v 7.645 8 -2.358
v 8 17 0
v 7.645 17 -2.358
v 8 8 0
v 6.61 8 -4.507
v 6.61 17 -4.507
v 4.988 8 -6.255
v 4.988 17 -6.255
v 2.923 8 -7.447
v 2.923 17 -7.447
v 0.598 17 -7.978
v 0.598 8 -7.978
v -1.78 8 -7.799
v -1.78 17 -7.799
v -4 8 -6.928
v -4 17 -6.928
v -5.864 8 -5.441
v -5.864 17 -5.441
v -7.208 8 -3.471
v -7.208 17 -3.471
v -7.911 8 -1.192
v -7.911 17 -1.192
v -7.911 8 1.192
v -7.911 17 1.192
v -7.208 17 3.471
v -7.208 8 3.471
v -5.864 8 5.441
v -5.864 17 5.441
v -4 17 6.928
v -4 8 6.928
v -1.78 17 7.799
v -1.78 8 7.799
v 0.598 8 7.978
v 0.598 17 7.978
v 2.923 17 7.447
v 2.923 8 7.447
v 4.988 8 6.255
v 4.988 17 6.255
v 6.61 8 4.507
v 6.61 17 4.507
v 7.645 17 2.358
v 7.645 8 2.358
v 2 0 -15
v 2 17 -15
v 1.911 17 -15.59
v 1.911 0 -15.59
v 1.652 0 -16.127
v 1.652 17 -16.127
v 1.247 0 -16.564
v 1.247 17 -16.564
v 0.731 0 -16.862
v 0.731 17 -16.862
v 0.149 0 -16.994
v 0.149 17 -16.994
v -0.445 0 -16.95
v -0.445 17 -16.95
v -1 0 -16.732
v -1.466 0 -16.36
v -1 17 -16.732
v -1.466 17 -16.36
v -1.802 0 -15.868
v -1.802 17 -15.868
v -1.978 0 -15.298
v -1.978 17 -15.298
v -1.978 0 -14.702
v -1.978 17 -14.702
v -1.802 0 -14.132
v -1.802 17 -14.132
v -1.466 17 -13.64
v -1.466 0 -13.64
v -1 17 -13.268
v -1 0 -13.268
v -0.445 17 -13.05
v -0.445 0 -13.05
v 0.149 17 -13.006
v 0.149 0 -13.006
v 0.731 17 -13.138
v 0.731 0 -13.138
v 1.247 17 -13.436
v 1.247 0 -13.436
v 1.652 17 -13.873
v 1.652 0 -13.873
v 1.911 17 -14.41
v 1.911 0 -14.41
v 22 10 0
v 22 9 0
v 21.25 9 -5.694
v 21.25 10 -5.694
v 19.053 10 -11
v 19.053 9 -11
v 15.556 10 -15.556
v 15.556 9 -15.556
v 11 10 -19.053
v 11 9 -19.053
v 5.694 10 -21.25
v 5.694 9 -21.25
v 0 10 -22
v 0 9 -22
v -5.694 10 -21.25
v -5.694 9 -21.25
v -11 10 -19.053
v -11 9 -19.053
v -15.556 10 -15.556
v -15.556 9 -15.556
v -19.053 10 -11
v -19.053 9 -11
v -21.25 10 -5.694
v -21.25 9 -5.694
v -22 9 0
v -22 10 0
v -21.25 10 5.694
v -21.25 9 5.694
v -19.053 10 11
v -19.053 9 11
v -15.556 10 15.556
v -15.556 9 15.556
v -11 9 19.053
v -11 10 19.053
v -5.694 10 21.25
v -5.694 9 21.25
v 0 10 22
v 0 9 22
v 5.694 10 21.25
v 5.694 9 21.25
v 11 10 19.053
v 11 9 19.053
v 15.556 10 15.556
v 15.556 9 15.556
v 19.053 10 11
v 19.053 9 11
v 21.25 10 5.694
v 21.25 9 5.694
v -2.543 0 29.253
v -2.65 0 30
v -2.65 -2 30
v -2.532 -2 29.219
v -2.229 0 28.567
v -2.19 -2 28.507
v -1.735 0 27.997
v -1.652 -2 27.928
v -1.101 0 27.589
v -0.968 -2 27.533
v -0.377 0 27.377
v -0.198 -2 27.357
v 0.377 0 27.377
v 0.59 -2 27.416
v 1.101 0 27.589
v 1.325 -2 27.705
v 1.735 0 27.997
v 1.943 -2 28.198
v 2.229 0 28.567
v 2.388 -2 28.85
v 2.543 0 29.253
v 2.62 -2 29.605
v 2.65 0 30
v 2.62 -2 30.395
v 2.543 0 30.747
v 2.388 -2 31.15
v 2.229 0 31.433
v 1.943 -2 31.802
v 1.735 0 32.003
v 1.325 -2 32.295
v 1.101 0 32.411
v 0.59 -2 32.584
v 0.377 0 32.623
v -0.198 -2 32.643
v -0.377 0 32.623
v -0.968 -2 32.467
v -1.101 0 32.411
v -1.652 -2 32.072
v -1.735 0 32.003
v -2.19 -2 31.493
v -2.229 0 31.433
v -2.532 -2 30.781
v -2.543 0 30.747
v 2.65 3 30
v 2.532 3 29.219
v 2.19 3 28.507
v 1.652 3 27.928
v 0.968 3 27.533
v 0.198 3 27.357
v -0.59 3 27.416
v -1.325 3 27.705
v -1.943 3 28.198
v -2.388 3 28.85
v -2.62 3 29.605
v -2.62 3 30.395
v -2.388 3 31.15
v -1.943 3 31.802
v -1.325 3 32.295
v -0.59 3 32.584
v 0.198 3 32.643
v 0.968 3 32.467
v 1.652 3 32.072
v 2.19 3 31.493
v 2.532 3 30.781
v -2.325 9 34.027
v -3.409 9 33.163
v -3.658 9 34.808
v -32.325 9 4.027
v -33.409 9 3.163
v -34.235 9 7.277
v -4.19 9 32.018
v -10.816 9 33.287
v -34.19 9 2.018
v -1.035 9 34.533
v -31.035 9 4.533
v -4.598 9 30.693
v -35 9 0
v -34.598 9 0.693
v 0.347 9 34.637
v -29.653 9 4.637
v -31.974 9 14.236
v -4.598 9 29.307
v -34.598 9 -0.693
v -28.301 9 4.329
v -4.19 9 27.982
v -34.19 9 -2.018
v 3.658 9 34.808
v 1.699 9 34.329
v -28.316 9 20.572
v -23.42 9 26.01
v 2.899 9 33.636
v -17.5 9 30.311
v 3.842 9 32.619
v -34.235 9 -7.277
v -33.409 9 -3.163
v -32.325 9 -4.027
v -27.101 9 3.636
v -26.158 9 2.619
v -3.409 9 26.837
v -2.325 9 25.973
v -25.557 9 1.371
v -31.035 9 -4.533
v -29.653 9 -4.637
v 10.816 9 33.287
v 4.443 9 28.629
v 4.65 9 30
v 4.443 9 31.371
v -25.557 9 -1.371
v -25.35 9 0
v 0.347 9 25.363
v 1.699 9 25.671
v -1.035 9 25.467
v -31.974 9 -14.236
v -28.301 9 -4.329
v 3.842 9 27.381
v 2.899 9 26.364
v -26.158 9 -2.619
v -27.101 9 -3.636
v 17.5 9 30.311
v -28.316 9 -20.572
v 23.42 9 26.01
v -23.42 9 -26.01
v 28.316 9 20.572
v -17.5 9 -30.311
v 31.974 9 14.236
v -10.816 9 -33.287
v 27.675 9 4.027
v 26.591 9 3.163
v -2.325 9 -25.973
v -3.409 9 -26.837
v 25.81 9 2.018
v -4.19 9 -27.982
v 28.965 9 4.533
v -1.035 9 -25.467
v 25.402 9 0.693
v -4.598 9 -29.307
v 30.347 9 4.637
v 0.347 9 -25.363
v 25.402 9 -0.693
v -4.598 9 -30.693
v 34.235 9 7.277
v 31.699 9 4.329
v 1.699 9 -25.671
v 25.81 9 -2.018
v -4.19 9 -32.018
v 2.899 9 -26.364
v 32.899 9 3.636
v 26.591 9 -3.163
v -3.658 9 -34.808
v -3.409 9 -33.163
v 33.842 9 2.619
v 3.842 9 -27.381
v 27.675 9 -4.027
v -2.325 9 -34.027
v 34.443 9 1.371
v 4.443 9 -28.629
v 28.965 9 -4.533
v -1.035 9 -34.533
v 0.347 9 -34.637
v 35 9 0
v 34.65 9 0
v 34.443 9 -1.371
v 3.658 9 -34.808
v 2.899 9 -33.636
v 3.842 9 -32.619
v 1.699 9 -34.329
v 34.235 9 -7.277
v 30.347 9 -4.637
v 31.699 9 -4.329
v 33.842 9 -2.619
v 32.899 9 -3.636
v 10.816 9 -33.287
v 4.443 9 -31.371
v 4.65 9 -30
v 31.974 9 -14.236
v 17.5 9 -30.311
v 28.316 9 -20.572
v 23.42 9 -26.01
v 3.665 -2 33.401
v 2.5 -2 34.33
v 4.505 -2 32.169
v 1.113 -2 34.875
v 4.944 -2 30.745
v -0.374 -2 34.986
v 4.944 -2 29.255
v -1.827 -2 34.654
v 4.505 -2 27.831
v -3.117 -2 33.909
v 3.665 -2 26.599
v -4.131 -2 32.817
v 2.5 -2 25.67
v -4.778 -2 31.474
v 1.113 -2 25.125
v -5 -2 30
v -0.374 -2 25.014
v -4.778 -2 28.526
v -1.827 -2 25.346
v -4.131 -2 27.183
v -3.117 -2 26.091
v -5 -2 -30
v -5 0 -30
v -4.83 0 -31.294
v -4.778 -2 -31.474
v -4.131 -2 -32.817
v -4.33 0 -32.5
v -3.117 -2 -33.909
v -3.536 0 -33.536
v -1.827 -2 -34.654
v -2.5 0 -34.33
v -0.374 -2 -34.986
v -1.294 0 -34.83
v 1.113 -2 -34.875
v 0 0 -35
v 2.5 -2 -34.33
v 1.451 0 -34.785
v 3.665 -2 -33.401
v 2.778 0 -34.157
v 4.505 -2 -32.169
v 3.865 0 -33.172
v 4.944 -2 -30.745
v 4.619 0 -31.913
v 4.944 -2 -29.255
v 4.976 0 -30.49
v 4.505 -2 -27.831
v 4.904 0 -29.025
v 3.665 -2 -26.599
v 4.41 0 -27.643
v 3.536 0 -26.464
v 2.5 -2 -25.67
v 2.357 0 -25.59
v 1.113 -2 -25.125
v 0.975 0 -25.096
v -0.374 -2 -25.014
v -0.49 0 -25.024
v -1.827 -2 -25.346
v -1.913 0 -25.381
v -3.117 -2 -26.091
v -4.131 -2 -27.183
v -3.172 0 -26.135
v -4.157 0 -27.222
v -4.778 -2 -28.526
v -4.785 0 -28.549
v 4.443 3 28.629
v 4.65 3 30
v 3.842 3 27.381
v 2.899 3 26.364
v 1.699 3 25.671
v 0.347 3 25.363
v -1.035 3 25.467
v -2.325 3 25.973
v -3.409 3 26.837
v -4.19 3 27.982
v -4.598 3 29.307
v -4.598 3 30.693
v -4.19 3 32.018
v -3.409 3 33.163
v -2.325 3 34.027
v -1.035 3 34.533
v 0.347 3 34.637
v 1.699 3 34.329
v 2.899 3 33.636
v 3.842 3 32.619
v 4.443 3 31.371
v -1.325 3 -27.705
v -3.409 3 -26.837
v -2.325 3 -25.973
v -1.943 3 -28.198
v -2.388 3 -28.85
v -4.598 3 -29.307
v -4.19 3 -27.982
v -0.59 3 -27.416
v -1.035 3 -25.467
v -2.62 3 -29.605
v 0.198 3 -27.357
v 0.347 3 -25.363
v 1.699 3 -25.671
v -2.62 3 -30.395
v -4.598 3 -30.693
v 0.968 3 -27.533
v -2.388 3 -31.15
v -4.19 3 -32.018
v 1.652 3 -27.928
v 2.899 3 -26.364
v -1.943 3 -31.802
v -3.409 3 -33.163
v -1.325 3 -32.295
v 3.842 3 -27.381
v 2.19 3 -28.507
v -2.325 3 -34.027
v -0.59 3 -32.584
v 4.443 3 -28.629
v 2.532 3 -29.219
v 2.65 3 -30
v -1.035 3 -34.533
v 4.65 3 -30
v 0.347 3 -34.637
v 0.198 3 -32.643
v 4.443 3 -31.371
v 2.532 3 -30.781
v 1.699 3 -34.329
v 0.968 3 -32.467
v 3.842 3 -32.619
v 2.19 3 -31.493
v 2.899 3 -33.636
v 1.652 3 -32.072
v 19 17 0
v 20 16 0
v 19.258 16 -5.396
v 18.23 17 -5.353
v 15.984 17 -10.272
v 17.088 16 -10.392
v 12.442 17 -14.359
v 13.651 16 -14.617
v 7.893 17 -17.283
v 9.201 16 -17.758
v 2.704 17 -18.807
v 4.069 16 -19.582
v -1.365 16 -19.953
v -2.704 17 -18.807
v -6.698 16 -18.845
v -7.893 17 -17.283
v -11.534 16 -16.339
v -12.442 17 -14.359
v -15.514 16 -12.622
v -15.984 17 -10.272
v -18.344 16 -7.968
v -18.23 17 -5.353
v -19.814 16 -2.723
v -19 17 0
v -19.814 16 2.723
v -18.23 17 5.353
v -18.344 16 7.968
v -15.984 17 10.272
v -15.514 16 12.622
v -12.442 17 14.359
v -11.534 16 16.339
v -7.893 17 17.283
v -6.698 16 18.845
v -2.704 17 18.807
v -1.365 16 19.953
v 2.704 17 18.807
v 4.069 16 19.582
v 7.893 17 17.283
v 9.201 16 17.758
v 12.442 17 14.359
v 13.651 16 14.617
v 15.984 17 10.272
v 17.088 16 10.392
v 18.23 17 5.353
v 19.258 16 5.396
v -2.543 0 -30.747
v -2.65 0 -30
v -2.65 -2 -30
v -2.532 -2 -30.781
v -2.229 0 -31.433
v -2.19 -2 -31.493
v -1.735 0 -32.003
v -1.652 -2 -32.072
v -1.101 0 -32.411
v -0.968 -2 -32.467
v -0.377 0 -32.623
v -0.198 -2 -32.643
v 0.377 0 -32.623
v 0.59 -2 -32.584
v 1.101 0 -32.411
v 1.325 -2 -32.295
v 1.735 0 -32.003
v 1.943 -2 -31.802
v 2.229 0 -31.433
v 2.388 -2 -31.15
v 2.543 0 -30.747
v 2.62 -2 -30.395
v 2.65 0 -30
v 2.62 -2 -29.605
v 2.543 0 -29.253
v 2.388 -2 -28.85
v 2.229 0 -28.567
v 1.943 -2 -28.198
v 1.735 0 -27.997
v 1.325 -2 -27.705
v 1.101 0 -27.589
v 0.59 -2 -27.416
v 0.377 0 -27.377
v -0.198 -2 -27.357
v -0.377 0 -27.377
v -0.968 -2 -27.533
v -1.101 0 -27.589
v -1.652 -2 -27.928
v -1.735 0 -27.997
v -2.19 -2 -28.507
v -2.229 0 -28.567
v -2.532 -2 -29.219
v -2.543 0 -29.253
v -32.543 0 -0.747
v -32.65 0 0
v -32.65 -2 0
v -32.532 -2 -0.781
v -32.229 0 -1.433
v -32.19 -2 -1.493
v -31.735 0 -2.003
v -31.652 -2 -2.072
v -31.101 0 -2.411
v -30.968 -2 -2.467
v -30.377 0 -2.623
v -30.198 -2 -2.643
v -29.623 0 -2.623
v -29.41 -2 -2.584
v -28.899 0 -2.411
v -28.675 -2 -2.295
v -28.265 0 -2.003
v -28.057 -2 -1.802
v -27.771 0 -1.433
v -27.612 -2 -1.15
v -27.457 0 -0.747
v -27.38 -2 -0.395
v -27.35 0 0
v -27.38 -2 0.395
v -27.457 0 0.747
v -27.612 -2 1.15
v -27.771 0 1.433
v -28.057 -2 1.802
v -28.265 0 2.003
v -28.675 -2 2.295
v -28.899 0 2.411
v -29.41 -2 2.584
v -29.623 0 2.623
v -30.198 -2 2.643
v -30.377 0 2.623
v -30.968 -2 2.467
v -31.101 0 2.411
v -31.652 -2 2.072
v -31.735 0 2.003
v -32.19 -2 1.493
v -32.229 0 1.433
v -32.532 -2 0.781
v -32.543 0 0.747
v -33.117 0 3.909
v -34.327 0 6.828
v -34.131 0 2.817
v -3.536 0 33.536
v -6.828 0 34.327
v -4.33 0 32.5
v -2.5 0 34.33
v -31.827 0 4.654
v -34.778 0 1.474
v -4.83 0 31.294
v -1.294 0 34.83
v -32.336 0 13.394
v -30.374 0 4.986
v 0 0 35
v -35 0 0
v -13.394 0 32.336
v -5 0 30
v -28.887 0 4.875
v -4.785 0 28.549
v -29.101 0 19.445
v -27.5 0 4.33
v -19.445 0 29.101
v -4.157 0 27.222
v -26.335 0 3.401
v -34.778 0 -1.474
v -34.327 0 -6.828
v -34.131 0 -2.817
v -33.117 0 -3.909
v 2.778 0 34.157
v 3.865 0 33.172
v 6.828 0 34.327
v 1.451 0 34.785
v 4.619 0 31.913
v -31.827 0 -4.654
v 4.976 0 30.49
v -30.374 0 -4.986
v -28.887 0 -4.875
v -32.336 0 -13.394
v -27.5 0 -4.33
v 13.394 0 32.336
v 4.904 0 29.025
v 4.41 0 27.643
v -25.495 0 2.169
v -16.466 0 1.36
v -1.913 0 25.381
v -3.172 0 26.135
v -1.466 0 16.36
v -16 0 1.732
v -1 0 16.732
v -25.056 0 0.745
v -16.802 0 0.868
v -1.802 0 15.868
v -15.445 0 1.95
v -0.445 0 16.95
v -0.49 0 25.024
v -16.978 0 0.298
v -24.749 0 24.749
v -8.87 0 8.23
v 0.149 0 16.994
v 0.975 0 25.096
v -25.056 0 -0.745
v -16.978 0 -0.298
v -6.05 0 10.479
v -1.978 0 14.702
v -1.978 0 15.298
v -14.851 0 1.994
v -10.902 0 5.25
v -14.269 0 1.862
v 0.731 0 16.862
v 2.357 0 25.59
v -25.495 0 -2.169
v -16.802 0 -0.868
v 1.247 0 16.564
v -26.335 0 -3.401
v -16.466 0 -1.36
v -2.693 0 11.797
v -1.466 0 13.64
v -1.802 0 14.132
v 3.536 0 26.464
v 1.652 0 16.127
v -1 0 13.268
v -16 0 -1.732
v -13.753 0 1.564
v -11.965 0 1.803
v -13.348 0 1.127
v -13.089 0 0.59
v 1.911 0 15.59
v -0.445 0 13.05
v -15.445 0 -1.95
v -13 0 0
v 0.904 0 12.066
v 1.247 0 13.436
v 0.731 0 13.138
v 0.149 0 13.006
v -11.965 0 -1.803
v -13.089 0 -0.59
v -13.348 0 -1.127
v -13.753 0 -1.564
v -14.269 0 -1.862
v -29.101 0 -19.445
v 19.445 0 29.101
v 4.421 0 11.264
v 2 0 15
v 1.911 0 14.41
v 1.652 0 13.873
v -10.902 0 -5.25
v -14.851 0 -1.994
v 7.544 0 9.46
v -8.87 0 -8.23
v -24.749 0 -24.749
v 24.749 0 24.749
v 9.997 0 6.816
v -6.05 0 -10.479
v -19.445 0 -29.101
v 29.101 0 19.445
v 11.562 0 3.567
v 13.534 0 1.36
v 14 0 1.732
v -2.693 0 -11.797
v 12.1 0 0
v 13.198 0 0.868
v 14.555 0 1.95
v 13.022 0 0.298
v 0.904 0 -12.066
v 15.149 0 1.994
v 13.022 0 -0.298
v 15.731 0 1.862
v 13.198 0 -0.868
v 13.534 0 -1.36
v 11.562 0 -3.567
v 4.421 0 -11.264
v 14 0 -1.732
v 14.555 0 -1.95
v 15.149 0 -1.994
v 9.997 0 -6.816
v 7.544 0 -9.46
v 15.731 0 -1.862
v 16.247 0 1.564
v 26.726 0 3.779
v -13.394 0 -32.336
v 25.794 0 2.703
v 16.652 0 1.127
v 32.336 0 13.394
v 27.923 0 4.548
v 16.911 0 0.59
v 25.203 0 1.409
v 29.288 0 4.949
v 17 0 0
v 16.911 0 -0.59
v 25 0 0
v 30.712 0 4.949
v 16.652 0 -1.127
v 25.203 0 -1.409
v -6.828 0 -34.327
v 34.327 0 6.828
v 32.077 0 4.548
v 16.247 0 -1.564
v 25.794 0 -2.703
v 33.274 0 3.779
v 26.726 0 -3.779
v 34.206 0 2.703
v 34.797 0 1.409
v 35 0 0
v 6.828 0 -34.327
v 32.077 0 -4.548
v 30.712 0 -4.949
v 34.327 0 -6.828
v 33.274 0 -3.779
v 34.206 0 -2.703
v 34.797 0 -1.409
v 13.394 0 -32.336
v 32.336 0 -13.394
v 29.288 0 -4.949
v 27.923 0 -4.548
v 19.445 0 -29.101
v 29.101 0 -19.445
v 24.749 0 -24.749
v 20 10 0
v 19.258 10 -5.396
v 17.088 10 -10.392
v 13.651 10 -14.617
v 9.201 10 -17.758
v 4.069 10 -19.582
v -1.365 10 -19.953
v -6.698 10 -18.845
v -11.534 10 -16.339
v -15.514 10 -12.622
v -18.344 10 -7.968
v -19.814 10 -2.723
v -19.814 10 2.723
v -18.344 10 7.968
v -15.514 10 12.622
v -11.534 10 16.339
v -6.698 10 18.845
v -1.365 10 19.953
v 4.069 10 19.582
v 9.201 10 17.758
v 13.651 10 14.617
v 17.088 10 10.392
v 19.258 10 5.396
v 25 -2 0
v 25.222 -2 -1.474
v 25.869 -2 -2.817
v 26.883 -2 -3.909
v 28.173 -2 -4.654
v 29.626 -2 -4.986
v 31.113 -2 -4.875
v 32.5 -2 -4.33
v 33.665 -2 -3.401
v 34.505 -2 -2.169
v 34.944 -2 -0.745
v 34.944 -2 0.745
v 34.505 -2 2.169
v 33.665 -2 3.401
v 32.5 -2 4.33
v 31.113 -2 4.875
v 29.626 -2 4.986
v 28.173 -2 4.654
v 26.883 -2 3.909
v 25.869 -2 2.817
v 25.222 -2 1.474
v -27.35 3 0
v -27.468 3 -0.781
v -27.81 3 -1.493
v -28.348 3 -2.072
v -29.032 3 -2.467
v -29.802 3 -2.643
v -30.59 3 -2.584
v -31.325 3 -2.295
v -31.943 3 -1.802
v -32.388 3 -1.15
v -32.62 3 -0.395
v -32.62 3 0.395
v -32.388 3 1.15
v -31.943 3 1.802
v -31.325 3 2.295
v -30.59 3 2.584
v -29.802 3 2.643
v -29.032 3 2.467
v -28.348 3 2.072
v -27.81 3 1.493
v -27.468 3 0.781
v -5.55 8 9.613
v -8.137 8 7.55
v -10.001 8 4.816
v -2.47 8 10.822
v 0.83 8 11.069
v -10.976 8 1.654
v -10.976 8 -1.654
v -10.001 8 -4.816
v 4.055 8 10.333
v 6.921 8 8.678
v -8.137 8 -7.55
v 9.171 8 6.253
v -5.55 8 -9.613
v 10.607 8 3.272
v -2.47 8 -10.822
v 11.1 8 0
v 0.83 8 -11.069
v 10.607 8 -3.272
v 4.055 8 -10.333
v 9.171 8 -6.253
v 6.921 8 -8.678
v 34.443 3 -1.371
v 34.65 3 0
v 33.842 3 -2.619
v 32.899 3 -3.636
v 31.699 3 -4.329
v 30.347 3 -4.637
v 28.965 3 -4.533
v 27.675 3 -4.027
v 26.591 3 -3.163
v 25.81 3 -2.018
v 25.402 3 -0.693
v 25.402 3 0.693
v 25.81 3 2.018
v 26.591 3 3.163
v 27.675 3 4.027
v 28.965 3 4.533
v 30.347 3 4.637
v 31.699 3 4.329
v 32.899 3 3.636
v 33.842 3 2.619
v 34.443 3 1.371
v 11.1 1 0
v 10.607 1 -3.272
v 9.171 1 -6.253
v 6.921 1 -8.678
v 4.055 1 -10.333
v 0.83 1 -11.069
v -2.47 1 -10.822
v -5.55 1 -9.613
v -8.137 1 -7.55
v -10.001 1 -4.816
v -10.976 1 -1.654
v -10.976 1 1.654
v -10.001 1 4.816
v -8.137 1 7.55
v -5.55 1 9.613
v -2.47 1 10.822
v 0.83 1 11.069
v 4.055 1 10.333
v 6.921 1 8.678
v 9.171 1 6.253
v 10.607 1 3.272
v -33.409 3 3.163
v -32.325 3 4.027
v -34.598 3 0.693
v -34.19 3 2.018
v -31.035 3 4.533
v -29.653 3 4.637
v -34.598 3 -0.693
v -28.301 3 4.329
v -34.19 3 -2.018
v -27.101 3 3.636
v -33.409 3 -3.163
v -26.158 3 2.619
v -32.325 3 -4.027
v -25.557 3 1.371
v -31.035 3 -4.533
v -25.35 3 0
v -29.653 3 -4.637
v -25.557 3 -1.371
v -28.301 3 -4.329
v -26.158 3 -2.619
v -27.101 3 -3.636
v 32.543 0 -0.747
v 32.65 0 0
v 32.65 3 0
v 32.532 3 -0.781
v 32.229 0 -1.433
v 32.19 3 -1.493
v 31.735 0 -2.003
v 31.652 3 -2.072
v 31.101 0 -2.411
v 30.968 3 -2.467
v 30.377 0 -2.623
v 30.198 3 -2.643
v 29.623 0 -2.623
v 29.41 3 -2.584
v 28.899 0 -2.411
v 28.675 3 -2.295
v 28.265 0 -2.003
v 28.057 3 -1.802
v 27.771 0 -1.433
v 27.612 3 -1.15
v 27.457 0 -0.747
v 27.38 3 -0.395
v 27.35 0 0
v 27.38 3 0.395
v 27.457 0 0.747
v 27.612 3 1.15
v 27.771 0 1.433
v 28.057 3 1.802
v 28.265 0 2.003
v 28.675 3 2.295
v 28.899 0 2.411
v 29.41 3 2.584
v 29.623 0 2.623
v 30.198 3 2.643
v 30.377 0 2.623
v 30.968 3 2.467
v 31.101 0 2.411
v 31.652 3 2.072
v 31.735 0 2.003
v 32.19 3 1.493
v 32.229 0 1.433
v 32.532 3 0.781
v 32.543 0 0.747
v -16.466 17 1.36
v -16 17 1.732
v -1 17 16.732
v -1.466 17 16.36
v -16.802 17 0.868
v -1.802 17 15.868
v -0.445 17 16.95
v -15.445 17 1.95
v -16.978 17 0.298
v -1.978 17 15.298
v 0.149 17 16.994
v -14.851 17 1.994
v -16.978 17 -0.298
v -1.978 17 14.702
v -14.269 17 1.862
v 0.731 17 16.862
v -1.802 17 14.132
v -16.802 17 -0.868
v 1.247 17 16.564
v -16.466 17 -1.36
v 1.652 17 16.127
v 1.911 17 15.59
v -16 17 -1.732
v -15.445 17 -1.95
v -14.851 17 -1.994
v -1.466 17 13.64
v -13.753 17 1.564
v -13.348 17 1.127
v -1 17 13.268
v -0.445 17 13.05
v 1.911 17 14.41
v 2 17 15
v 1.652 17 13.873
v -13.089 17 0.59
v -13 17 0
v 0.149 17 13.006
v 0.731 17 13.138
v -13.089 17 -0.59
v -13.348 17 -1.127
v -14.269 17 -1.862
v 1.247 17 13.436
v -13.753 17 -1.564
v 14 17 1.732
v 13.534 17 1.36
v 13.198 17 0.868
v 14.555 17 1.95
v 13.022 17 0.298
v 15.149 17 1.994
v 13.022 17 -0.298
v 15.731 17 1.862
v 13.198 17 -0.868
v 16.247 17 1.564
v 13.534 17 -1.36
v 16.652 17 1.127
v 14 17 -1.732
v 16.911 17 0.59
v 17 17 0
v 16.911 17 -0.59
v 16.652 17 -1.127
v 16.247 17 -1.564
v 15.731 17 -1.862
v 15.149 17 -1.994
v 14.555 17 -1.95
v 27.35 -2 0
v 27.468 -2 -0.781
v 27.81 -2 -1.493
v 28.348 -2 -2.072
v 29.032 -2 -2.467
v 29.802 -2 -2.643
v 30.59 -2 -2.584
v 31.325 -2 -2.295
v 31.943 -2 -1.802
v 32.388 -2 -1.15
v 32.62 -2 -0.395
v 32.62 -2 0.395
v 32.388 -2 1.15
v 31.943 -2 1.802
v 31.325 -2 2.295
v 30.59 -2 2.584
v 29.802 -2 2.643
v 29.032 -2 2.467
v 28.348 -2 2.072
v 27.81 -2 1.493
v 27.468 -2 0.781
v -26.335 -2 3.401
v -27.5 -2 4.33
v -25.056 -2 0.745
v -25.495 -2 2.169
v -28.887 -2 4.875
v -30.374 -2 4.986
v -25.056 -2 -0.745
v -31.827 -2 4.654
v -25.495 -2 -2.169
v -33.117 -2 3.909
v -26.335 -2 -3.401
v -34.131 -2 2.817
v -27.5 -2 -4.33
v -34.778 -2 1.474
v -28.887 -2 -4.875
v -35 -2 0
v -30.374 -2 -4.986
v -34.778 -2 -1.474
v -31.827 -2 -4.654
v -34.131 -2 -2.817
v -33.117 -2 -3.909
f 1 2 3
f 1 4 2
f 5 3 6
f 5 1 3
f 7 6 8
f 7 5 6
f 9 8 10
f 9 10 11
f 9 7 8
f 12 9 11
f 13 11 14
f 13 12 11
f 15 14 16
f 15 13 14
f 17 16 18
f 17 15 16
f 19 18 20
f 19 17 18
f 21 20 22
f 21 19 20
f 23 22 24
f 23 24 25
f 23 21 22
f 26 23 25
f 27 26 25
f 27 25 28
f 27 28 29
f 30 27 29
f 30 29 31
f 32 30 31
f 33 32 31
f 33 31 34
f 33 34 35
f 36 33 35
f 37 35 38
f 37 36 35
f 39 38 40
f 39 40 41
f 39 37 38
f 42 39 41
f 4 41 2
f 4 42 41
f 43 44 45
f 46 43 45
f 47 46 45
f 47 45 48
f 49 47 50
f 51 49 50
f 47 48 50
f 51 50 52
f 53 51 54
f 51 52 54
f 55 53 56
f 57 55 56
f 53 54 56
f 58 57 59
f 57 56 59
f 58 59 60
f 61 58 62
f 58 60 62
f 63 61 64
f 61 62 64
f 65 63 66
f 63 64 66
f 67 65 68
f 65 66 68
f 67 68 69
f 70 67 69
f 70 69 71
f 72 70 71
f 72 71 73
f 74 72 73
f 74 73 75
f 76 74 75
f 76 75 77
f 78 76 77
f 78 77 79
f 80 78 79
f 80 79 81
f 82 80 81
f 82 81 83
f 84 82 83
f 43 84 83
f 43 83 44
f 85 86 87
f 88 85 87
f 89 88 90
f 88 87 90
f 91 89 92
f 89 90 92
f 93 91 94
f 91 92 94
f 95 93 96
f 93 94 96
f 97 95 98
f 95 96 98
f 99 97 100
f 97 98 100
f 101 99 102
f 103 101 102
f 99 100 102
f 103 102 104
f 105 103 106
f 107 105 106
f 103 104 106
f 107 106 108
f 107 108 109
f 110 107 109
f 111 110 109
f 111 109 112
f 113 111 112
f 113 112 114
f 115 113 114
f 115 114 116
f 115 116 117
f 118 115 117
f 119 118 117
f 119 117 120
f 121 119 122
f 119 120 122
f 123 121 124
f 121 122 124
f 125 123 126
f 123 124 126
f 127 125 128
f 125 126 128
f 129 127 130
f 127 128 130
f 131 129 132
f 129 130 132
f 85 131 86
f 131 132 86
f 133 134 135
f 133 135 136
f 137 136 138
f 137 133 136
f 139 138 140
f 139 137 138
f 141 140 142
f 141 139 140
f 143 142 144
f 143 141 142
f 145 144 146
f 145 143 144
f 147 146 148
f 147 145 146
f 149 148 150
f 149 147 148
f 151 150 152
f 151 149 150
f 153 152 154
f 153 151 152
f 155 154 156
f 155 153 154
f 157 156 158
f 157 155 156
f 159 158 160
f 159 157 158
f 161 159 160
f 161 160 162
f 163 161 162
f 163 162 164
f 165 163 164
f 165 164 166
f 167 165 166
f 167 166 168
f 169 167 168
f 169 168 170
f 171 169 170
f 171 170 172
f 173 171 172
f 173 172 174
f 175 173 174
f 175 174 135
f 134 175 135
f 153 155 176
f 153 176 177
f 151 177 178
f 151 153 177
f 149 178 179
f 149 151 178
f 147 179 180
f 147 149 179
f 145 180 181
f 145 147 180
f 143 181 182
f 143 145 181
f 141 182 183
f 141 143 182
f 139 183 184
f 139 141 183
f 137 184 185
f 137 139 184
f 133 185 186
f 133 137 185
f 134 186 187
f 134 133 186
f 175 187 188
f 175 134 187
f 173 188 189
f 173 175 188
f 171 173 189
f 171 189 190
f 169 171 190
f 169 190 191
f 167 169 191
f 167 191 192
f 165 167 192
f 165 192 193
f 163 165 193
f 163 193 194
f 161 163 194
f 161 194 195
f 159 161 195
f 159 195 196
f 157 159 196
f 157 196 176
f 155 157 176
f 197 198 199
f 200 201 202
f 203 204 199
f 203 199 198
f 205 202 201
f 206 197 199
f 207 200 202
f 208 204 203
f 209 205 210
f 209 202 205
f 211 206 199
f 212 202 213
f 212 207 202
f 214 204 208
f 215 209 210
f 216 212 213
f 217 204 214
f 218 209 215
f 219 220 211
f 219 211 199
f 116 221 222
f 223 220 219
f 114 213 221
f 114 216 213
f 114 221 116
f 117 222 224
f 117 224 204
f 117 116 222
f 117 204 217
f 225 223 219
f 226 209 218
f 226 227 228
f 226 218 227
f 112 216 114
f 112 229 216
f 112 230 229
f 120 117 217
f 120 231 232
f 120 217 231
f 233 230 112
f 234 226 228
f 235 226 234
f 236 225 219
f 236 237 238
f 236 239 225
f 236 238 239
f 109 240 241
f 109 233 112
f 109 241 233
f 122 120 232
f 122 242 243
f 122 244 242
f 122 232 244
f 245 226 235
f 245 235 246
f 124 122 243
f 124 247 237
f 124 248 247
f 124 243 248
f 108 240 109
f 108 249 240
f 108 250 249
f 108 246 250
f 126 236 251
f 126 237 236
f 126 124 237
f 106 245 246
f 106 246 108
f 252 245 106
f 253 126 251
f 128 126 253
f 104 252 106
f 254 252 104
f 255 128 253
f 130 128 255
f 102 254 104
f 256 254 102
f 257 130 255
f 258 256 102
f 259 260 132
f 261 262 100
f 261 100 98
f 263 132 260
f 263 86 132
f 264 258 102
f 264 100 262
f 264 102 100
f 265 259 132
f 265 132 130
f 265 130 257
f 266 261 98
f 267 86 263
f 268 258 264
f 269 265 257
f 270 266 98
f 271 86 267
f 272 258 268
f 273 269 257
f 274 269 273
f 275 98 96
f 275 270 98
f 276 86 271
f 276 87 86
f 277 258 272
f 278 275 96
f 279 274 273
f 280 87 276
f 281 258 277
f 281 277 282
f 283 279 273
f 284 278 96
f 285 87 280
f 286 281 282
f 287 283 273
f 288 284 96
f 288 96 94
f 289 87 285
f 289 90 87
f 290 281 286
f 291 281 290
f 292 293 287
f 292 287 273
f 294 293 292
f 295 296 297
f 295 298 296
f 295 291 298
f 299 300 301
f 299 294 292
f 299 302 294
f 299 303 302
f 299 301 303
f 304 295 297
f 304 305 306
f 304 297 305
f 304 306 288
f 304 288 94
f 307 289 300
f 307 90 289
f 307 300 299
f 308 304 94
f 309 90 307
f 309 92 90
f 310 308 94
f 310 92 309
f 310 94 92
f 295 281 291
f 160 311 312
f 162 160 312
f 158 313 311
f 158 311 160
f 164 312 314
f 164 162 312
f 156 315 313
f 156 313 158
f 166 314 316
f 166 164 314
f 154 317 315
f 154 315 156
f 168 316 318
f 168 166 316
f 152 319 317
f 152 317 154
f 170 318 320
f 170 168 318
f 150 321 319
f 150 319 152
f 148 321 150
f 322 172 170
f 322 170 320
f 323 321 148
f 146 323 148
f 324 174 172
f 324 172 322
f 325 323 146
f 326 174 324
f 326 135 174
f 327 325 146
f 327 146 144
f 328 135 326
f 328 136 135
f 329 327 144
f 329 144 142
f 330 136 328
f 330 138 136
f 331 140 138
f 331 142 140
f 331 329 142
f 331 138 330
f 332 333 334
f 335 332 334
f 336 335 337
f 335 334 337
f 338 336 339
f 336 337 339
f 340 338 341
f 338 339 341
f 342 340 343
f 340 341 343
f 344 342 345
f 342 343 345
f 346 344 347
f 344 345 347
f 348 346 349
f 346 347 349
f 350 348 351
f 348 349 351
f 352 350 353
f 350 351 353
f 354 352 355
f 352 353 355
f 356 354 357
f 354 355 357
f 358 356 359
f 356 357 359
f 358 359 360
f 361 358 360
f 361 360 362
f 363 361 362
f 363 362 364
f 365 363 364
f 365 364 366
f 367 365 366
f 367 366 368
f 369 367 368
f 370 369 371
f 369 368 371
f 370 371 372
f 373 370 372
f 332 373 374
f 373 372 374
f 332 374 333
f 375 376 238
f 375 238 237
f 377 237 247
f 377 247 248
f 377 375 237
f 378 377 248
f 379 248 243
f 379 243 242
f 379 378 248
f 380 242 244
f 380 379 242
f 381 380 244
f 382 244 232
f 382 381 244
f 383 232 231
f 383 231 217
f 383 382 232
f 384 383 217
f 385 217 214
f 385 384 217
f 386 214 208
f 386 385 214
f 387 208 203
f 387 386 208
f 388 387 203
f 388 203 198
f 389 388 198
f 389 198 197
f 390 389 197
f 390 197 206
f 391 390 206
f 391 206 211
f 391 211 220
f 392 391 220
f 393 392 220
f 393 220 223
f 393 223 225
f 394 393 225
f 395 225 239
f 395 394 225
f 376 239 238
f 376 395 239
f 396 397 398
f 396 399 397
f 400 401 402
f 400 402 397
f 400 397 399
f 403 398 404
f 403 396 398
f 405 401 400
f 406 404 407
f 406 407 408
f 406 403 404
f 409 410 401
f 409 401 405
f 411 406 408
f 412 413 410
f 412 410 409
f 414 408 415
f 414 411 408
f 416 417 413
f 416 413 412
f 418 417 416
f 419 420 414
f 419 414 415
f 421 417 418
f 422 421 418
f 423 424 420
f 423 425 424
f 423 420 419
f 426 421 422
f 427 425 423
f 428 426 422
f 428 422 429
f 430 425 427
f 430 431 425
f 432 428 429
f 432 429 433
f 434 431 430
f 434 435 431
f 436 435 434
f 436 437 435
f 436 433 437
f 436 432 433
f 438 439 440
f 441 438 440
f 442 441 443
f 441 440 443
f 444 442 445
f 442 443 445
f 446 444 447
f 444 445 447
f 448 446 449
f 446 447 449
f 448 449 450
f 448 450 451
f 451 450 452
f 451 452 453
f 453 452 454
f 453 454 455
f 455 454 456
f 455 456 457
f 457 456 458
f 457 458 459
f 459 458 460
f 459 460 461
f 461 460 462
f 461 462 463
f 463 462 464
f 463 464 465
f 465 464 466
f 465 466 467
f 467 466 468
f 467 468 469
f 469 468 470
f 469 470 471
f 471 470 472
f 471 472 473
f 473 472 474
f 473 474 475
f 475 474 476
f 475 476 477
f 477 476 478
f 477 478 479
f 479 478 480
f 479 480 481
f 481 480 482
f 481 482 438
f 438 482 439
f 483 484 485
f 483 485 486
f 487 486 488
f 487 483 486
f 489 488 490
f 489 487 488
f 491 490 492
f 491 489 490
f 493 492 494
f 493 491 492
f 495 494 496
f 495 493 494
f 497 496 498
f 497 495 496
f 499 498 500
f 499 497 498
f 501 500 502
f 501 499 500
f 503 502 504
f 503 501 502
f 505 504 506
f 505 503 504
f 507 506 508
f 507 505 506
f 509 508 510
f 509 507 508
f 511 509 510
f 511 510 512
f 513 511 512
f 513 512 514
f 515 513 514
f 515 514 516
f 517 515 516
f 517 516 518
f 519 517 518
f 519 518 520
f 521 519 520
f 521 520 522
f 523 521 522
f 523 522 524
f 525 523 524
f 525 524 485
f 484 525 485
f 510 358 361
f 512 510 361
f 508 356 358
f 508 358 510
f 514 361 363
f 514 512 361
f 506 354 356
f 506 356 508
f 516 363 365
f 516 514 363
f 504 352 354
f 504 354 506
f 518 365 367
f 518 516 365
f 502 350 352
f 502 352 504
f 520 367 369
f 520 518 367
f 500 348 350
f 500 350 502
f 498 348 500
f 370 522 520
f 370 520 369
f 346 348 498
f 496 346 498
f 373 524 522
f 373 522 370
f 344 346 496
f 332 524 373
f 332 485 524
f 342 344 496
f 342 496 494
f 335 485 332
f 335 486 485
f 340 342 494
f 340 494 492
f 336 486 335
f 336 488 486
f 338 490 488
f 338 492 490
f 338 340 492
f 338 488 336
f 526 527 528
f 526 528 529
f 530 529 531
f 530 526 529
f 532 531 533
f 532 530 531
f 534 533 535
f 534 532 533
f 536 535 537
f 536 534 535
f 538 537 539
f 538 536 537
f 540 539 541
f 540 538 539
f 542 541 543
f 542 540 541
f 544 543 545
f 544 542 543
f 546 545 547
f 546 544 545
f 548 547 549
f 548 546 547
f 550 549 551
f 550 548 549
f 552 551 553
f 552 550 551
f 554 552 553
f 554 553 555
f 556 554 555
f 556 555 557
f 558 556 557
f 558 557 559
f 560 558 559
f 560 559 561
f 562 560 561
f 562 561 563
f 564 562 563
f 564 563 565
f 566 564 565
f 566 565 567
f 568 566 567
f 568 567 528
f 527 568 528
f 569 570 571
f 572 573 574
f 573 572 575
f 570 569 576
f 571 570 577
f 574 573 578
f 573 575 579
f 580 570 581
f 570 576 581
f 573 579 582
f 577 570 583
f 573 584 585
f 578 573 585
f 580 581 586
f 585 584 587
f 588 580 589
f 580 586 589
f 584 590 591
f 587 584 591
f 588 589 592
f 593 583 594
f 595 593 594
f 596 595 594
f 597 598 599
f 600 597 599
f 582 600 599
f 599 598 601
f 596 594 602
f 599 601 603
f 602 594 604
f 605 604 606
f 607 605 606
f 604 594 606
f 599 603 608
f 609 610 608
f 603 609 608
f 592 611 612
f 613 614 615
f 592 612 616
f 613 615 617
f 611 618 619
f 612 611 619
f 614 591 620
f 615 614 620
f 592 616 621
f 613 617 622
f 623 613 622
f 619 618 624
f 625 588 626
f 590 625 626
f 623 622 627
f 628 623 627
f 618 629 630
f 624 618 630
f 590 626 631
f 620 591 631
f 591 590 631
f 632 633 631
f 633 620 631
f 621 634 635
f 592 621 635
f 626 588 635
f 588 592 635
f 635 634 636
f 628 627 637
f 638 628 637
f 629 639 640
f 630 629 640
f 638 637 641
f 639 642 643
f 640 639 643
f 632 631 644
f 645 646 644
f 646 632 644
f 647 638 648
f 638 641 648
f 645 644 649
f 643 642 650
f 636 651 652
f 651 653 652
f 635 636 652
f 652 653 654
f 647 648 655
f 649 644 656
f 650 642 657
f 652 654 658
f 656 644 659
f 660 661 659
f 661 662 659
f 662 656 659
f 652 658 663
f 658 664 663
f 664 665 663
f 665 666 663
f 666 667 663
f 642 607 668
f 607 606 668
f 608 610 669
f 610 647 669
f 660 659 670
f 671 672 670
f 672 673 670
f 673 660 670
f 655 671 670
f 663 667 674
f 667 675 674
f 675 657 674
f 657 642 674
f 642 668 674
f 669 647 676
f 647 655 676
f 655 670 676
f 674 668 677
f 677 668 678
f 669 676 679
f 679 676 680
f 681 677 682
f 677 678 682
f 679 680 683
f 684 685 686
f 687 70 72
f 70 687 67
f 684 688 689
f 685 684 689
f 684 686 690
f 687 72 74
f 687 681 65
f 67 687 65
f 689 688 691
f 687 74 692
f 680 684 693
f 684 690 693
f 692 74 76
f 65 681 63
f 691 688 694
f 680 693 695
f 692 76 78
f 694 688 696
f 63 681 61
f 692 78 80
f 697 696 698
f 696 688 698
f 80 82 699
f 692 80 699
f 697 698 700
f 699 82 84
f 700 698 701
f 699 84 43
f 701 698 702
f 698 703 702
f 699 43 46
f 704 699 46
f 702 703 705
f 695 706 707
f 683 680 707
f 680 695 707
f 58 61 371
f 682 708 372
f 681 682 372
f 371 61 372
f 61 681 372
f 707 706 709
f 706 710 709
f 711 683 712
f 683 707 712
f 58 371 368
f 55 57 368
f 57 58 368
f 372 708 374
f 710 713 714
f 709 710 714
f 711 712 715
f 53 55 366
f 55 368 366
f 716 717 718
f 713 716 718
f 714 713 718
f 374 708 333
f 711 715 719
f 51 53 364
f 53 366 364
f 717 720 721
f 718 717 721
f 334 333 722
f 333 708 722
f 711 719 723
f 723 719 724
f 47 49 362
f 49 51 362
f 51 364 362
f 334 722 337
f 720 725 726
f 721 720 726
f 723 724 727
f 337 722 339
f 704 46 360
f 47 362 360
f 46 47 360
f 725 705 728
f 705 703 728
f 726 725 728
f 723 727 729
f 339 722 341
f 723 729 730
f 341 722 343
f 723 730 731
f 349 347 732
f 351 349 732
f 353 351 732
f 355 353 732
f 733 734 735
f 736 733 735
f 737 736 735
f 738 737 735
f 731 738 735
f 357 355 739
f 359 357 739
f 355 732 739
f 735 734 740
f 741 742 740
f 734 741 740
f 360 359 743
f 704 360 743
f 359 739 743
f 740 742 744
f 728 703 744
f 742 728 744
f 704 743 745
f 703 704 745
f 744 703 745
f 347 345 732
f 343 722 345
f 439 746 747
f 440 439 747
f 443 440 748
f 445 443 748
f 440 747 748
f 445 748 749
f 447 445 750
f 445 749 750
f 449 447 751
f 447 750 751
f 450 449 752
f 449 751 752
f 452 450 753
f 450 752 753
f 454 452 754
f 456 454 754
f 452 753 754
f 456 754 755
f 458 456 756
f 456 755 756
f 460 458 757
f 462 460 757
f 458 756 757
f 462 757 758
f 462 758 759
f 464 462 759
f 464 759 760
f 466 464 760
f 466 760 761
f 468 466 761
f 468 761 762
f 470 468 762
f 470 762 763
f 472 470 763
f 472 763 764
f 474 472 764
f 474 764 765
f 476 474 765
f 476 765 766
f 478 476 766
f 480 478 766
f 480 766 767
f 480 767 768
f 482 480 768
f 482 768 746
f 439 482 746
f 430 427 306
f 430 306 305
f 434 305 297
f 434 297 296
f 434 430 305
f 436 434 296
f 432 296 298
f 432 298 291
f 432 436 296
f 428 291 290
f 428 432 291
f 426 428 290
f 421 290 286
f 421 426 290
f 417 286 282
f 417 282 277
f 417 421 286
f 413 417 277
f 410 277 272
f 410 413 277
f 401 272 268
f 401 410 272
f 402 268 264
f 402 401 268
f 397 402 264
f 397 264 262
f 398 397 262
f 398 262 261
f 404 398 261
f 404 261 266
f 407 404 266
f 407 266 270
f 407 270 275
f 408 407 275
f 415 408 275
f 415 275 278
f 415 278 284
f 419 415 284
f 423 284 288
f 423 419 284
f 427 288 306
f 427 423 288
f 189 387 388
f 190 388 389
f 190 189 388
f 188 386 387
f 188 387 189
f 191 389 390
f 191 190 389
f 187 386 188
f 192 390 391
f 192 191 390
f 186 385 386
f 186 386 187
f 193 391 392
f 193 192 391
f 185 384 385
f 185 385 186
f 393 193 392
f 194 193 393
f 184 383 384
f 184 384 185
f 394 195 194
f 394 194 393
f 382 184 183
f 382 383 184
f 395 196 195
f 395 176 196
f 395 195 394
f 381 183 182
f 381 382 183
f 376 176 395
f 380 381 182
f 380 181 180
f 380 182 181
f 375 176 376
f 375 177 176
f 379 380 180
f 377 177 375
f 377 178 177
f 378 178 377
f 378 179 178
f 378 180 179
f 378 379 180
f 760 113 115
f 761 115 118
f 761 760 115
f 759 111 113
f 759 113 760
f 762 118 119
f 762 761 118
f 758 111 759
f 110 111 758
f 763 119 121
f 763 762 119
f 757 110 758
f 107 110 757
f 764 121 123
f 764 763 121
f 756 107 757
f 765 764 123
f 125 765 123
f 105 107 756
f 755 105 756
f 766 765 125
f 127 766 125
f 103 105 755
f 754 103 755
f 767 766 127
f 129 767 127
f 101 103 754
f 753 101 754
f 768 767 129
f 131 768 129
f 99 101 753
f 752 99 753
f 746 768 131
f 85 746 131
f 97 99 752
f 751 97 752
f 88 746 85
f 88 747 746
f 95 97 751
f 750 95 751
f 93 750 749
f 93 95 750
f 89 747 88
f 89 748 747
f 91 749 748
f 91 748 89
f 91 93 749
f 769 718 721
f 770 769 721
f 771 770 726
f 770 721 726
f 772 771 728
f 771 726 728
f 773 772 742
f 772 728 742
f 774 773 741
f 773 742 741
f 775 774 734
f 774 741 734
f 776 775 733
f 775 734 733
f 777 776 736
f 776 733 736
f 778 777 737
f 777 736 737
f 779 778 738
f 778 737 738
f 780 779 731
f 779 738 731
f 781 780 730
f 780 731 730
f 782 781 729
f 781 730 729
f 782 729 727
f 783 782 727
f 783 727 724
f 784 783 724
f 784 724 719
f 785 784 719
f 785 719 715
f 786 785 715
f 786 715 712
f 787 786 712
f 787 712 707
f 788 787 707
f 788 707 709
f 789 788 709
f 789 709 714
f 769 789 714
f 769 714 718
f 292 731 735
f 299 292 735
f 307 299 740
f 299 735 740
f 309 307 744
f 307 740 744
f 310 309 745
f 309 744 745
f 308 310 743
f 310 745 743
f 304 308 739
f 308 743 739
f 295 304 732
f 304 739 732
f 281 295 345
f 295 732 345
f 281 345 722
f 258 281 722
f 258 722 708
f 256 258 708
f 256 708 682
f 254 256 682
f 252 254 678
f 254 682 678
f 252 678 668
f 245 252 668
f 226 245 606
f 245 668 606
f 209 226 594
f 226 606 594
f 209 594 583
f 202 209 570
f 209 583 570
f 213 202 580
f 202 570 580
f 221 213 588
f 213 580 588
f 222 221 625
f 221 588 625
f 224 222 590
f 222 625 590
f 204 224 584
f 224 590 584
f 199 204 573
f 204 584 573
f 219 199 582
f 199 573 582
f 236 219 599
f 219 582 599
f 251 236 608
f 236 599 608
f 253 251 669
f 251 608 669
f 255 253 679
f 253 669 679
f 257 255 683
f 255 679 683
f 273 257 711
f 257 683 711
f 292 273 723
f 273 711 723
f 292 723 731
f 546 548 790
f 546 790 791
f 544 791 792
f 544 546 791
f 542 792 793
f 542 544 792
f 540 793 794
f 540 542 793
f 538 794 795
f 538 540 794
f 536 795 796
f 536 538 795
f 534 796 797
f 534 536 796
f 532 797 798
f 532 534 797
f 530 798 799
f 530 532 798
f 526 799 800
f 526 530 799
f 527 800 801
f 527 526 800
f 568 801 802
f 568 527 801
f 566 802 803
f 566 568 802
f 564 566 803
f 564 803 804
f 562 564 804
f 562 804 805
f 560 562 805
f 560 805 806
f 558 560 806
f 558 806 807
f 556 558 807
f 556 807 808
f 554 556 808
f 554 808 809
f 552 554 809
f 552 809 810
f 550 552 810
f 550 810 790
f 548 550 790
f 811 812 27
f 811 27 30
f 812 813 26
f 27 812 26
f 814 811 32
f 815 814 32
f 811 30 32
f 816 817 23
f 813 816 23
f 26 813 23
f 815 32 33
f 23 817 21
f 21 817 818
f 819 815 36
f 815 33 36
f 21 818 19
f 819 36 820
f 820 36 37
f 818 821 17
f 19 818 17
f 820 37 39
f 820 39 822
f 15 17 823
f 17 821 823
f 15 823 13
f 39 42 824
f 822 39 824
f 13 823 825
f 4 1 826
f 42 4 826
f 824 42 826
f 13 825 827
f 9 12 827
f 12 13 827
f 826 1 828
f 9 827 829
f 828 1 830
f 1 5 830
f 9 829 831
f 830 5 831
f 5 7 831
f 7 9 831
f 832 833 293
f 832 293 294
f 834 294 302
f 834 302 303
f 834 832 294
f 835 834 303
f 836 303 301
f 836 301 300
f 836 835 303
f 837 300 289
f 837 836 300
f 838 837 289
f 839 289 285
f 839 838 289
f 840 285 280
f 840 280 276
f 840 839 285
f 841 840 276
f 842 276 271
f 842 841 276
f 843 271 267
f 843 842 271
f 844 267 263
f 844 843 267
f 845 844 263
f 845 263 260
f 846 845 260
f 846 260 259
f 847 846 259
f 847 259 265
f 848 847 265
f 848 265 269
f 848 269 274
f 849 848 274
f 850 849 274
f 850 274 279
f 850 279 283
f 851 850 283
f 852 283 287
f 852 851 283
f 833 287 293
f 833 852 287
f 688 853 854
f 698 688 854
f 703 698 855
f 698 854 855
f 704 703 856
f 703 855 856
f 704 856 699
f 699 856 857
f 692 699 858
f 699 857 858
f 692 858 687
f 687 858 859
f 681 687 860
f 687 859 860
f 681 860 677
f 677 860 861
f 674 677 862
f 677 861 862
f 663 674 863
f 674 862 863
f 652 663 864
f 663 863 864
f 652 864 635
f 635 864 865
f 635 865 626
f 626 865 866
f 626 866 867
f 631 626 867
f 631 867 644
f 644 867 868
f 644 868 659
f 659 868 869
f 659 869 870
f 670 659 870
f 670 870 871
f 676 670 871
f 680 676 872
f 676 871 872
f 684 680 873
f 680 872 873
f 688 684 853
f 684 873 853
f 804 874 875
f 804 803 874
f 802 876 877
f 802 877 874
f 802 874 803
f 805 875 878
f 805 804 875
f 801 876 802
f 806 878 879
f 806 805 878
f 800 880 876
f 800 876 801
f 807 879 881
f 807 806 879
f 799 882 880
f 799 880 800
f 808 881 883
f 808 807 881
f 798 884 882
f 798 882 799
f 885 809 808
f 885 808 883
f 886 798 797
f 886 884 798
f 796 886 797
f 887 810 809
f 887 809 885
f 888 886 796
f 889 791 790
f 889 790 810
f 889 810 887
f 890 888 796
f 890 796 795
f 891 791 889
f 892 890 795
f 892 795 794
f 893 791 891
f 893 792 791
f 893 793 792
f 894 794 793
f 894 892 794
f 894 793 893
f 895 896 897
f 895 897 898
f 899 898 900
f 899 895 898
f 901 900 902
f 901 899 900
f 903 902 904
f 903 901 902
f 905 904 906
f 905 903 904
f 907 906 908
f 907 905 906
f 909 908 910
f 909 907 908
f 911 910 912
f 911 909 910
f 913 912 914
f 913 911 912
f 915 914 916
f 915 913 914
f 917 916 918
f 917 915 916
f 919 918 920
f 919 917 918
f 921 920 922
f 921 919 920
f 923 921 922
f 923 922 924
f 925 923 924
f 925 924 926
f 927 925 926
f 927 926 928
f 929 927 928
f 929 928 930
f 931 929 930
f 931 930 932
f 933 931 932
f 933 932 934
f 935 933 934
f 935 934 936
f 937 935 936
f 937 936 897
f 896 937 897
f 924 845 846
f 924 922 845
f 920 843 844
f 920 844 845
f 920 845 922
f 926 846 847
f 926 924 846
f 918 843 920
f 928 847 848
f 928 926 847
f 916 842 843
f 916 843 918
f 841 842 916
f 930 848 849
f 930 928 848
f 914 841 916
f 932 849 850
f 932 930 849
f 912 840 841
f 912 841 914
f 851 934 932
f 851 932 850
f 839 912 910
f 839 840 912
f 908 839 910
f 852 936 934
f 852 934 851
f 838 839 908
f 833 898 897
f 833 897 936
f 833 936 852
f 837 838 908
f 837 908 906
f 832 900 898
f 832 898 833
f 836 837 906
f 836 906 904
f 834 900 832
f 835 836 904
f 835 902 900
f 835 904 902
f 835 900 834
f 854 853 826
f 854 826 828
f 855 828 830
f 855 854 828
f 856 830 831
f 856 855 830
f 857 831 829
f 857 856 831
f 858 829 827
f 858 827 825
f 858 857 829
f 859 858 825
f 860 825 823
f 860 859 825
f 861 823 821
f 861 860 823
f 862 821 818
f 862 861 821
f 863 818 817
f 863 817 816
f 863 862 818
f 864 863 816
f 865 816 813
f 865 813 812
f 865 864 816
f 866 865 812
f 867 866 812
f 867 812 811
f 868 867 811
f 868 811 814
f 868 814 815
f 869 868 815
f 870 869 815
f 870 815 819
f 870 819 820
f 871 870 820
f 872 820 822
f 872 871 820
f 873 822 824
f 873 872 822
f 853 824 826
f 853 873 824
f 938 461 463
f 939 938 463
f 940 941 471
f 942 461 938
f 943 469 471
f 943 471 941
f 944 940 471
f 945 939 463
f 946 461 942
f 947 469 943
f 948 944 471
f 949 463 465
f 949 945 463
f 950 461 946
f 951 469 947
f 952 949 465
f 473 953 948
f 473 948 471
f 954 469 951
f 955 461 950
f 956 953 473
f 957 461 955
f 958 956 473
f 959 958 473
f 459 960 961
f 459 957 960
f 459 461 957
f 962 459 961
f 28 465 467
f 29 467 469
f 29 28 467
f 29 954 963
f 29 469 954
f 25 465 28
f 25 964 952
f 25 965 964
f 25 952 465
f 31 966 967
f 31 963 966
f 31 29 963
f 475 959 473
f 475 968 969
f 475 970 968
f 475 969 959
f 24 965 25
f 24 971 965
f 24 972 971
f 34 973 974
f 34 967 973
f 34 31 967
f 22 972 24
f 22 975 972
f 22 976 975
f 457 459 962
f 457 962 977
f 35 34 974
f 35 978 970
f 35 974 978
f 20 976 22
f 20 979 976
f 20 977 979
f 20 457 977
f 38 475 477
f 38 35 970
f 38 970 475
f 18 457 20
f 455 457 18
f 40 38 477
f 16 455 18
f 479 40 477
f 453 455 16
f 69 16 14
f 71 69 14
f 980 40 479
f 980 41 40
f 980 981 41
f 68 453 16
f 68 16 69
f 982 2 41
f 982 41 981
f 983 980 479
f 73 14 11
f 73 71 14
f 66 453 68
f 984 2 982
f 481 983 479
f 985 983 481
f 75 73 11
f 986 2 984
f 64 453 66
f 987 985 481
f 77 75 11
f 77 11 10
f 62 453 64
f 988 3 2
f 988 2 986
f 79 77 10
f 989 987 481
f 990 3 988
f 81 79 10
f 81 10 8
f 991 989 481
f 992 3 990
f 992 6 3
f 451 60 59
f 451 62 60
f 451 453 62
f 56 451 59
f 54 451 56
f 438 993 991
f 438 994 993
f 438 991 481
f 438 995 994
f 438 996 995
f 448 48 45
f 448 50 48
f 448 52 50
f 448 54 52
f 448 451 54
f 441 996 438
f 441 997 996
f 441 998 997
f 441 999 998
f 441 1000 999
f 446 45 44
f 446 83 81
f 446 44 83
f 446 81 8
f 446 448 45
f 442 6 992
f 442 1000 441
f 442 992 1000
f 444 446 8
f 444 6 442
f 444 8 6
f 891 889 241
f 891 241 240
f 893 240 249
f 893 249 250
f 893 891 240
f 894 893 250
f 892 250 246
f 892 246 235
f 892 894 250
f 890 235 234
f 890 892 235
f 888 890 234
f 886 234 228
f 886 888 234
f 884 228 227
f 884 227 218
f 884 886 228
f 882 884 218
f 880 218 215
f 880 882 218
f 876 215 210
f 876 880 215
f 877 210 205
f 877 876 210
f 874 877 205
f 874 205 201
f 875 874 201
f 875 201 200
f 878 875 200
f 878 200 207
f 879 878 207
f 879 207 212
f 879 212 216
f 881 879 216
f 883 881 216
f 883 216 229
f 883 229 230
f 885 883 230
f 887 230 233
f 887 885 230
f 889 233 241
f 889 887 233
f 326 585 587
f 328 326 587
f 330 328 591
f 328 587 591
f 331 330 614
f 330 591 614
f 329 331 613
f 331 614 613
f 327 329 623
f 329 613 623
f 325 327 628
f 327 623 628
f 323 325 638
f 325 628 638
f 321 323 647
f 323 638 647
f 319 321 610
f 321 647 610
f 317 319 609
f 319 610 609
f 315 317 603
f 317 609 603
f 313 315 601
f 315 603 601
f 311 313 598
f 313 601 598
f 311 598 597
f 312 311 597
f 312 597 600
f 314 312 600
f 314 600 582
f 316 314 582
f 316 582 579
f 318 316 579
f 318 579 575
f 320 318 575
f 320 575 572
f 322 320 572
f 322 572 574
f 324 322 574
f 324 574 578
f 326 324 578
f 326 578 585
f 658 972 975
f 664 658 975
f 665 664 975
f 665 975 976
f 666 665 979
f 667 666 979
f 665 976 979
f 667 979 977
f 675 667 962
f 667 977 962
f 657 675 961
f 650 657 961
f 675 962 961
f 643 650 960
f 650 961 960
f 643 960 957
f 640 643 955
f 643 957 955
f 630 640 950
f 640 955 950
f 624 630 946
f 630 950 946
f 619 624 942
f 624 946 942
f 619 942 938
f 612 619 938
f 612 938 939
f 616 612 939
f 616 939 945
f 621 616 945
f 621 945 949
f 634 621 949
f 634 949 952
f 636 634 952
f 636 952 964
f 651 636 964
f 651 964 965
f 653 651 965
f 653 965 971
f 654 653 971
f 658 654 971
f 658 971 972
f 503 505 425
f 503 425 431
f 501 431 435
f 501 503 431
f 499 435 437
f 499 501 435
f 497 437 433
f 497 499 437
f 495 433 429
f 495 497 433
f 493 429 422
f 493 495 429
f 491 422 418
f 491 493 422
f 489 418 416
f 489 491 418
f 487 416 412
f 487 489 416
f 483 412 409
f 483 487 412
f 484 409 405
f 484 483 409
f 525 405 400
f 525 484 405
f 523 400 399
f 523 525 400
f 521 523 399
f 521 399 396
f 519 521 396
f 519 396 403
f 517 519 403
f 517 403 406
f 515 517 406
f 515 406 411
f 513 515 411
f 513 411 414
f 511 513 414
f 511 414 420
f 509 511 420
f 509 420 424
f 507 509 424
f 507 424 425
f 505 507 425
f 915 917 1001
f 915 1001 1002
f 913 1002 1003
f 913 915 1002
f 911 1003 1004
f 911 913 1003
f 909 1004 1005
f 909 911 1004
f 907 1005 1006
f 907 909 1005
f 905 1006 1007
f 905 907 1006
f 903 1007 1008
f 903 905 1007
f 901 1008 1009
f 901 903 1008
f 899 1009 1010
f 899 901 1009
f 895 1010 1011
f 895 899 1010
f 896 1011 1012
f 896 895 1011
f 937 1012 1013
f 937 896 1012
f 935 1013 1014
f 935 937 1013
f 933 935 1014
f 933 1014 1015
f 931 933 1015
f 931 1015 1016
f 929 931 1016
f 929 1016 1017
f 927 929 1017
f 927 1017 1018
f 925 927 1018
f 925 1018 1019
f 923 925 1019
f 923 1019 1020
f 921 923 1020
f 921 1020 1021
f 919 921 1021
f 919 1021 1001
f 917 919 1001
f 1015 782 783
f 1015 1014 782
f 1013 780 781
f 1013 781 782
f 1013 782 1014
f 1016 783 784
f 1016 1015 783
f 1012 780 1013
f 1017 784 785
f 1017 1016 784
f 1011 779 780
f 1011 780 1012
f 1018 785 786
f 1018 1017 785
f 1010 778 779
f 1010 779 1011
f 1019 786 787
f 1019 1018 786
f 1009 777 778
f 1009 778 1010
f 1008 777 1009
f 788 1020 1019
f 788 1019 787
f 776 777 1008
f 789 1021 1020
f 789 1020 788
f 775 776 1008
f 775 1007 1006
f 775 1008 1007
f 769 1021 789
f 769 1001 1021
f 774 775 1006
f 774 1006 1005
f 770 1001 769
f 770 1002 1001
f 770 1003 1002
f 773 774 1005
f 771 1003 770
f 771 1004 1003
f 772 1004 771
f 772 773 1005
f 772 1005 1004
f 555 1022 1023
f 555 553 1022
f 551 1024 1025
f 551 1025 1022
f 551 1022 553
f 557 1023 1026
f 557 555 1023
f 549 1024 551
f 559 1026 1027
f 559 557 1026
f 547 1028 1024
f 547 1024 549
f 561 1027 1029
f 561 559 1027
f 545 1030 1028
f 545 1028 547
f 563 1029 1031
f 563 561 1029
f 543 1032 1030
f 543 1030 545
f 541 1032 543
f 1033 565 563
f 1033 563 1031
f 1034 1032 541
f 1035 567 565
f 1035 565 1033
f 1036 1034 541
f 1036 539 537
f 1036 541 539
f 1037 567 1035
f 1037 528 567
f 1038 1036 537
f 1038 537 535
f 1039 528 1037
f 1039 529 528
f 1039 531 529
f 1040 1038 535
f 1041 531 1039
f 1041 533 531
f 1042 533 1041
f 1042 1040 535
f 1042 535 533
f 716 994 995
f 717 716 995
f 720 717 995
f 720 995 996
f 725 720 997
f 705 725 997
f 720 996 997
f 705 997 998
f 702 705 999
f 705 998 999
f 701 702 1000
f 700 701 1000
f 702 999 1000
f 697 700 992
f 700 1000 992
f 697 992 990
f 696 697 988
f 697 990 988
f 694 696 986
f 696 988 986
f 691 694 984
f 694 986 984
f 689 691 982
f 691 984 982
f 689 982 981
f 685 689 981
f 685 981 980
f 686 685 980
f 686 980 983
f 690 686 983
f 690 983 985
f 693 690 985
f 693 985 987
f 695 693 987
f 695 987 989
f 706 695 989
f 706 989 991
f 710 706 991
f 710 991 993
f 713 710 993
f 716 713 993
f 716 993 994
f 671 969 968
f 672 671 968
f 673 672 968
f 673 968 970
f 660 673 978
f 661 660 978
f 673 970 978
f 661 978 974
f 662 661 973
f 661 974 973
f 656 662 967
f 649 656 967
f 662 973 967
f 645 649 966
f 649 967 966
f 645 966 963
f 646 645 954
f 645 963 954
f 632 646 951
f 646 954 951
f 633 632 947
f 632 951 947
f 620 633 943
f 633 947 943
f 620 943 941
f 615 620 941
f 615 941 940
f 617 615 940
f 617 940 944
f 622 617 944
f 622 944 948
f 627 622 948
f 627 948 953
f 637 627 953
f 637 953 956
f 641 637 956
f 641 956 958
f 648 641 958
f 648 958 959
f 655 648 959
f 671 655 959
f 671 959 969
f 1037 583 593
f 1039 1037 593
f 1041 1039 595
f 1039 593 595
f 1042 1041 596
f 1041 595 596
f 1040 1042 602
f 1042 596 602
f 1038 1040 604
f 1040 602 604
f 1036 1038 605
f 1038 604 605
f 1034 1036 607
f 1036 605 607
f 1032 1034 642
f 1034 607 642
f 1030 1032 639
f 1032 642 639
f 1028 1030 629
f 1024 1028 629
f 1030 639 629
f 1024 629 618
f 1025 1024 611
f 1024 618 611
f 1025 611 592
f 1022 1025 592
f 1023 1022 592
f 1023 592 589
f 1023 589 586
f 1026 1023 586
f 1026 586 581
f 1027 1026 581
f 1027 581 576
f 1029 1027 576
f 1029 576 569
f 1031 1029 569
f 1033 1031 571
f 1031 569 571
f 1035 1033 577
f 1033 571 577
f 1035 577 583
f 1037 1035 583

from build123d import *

# Parameters (mm, degrees)
SKETCH1_R           = 35
SKETCH1_R_2         = 11.1
SKETCH1_R_3         = 2.65
BOSS_EXTRUDE1_DEPTH = 3
SKETCH2_R           = 35
SKETCH2_R_2         = 4.65
SKETCH2_R_3         = 11.1
BOSS_EXTRUDE2_DEPTH = 6
SKETCH3_R           = 11.1
SKETCH3_R_2         = 8
BOSS_EXTRUDE3_DEPTH = 1
SKETCH4_R           = 20
SKETCH4_R_2         = 8
BOSS_EXTRUDE4_DEPTH = 8
SKETCH5_R           = 22
SKETCH5_R_2         = 20
BOSS_EXTRUDE5_DEPTH = 1
SKETCH6_R           = 5
SKETCH6_R_2         = 2.65
BOSS_EXTRUDE6_DEPTH = 2
SKETCH7_R           = 2
CUT_EXTRUDE1_DEPTH  = 20
CHAMFER1_SIZE       = 1


with BuildPart() as part:
    # Sketch1 → Boss-Extrude1 (new body)
    with BuildSketch(Plane(origin=(0, 0, 0), x_dir=(1, 0, 0), z_dir=(0, 1, 0))):
        Circle(SKETCH1_R)
        Circle(SKETCH1_R_2, mode=Mode.SUBTRACT)
        with Locations((0, 30)):
            Circle(SKETCH1_R_3, mode=Mode.SUBTRACT)
        with Locations((30, 0)):
            Circle(SKETCH1_R_3, mode=Mode.SUBTRACT)
        with Locations((0, -30)):
            Circle(SKETCH1_R_3, mode=Mode.SUBTRACT)
        with Locations((-30, 0)):
            Circle(SKETCH1_R_3, mode=Mode.SUBTRACT)
    extrude(amount=BOSS_EXTRUDE1_DEPTH)

    # Sketch2 → Boss-Extrude2 (add)
    with BuildSketch(Plane(origin=(0, 3, 0), x_dir=(1, 0, 0), z_dir=(0, 1, 0))):
        Circle(SKETCH2_R)
        with Locations((0, -30)):
            Circle(SKETCH2_R_2, mode=Mode.SUBTRACT)
        with Locations((30, 0)):
            Circle(SKETCH2_R_2, mode=Mode.SUBTRACT)
        with Locations((0, 30)):
            Circle(SKETCH2_R_2, mode=Mode.SUBTRACT)
        with Locations((-30, 0)):
            Circle(SKETCH2_R_2, mode=Mode.SUBTRACT)
        Circle(SKETCH2_R_3, mode=Mode.SUBTRACT)
    extrude(amount=BOSS_EXTRUDE2_DEPTH)

    # Sketch3 → Boss-Extrude3 (add)
    with BuildSketch(Plane(origin=(0, 9, 0), x_dir=(1, 0, 0), z_dir=(0, 1, 0))):
        Circle(SKETCH3_R)
        Circle(SKETCH3_R_2, mode=Mode.SUBTRACT)
    extrude(amount=-BOSS_EXTRUDE3_DEPTH)

    # Sketch4 → Boss-Extrude4 (add)
    with BuildSketch(Plane(origin=(0, 9, 0), x_dir=(1, 0, 0), z_dir=(0, 1, 0))):
        Circle(SKETCH4_R)
        Circle(SKETCH4_R_2, mode=Mode.SUBTRACT)
    extrude(amount=BOSS_EXTRUDE4_DEPTH)

    # Sketch5 → Boss-Extrude5 (add)
    with BuildSketch(Plane(origin=(0, 9, 0), x_dir=(1, 0, 0), z_dir=(0, 1, 0))):
        Circle(SKETCH5_R)
        Circle(SKETCH5_R_2, mode=Mode.SUBTRACT)
    extrude(amount=BOSS_EXTRUDE5_DEPTH)

    # Sketch6 → Boss-Extrude6 (add)
    with BuildSketch(Plane(origin=(0, 0, 0), x_dir=(-1, 0, 0), z_dir=(0, -1, 0))):
        with Locations((30, 0)):
            Circle(SKETCH6_R)
        with Locations((30, 0)):
            Circle(SKETCH6_R_2, mode=Mode.SUBTRACT)
        with Locations((0, -30)):
            Circle(SKETCH6_R)
        with Locations((0, -30)):
            Circle(SKETCH6_R_2, mode=Mode.SUBTRACT)
        with Locations((-30, 0)):
            Circle(SKETCH6_R)
        with Locations((-30, 0)):
            Circle(SKETCH6_R_2, mode=Mode.SUBTRACT)
        with Locations((0, 30)):
            Circle(SKETCH6_R)
        with Locations((0, 30)):
            Circle(SKETCH6_R_2, mode=Mode.SUBTRACT)
    extrude(amount=BOSS_EXTRUDE6_DEPTH)

    # Sketch7 → Cut-Extrude1 (cut, through all)
    with BuildSketch(Plane(origin=(0, 17, 0), x_dir=(1, 0, 0), z_dir=(0, 1, 0))):
        with Locations((0, 15)):
            Circle(SKETCH7_R)
        with Locations((15, 0)):
            Circle(SKETCH7_R)
        with Locations((0, -15)):
            Circle(SKETCH7_R)
        with Locations((-15, 0)):
            Circle(SKETCH7_R)
    extrude(amount=-CUT_EXTRUDE1_DEPTH, mode=Mode.SUBTRACT)

    # Chamfer1
    chamfer1_edges = [part.edges().sort_by_distance(p)[0] for p in [
        (-11.1, 0, 0),
        (-20, 17, 0),
    ]]
    chamfer(chamfer1_edges, length=CHAMFER1_SIZE)


solid = part.part
